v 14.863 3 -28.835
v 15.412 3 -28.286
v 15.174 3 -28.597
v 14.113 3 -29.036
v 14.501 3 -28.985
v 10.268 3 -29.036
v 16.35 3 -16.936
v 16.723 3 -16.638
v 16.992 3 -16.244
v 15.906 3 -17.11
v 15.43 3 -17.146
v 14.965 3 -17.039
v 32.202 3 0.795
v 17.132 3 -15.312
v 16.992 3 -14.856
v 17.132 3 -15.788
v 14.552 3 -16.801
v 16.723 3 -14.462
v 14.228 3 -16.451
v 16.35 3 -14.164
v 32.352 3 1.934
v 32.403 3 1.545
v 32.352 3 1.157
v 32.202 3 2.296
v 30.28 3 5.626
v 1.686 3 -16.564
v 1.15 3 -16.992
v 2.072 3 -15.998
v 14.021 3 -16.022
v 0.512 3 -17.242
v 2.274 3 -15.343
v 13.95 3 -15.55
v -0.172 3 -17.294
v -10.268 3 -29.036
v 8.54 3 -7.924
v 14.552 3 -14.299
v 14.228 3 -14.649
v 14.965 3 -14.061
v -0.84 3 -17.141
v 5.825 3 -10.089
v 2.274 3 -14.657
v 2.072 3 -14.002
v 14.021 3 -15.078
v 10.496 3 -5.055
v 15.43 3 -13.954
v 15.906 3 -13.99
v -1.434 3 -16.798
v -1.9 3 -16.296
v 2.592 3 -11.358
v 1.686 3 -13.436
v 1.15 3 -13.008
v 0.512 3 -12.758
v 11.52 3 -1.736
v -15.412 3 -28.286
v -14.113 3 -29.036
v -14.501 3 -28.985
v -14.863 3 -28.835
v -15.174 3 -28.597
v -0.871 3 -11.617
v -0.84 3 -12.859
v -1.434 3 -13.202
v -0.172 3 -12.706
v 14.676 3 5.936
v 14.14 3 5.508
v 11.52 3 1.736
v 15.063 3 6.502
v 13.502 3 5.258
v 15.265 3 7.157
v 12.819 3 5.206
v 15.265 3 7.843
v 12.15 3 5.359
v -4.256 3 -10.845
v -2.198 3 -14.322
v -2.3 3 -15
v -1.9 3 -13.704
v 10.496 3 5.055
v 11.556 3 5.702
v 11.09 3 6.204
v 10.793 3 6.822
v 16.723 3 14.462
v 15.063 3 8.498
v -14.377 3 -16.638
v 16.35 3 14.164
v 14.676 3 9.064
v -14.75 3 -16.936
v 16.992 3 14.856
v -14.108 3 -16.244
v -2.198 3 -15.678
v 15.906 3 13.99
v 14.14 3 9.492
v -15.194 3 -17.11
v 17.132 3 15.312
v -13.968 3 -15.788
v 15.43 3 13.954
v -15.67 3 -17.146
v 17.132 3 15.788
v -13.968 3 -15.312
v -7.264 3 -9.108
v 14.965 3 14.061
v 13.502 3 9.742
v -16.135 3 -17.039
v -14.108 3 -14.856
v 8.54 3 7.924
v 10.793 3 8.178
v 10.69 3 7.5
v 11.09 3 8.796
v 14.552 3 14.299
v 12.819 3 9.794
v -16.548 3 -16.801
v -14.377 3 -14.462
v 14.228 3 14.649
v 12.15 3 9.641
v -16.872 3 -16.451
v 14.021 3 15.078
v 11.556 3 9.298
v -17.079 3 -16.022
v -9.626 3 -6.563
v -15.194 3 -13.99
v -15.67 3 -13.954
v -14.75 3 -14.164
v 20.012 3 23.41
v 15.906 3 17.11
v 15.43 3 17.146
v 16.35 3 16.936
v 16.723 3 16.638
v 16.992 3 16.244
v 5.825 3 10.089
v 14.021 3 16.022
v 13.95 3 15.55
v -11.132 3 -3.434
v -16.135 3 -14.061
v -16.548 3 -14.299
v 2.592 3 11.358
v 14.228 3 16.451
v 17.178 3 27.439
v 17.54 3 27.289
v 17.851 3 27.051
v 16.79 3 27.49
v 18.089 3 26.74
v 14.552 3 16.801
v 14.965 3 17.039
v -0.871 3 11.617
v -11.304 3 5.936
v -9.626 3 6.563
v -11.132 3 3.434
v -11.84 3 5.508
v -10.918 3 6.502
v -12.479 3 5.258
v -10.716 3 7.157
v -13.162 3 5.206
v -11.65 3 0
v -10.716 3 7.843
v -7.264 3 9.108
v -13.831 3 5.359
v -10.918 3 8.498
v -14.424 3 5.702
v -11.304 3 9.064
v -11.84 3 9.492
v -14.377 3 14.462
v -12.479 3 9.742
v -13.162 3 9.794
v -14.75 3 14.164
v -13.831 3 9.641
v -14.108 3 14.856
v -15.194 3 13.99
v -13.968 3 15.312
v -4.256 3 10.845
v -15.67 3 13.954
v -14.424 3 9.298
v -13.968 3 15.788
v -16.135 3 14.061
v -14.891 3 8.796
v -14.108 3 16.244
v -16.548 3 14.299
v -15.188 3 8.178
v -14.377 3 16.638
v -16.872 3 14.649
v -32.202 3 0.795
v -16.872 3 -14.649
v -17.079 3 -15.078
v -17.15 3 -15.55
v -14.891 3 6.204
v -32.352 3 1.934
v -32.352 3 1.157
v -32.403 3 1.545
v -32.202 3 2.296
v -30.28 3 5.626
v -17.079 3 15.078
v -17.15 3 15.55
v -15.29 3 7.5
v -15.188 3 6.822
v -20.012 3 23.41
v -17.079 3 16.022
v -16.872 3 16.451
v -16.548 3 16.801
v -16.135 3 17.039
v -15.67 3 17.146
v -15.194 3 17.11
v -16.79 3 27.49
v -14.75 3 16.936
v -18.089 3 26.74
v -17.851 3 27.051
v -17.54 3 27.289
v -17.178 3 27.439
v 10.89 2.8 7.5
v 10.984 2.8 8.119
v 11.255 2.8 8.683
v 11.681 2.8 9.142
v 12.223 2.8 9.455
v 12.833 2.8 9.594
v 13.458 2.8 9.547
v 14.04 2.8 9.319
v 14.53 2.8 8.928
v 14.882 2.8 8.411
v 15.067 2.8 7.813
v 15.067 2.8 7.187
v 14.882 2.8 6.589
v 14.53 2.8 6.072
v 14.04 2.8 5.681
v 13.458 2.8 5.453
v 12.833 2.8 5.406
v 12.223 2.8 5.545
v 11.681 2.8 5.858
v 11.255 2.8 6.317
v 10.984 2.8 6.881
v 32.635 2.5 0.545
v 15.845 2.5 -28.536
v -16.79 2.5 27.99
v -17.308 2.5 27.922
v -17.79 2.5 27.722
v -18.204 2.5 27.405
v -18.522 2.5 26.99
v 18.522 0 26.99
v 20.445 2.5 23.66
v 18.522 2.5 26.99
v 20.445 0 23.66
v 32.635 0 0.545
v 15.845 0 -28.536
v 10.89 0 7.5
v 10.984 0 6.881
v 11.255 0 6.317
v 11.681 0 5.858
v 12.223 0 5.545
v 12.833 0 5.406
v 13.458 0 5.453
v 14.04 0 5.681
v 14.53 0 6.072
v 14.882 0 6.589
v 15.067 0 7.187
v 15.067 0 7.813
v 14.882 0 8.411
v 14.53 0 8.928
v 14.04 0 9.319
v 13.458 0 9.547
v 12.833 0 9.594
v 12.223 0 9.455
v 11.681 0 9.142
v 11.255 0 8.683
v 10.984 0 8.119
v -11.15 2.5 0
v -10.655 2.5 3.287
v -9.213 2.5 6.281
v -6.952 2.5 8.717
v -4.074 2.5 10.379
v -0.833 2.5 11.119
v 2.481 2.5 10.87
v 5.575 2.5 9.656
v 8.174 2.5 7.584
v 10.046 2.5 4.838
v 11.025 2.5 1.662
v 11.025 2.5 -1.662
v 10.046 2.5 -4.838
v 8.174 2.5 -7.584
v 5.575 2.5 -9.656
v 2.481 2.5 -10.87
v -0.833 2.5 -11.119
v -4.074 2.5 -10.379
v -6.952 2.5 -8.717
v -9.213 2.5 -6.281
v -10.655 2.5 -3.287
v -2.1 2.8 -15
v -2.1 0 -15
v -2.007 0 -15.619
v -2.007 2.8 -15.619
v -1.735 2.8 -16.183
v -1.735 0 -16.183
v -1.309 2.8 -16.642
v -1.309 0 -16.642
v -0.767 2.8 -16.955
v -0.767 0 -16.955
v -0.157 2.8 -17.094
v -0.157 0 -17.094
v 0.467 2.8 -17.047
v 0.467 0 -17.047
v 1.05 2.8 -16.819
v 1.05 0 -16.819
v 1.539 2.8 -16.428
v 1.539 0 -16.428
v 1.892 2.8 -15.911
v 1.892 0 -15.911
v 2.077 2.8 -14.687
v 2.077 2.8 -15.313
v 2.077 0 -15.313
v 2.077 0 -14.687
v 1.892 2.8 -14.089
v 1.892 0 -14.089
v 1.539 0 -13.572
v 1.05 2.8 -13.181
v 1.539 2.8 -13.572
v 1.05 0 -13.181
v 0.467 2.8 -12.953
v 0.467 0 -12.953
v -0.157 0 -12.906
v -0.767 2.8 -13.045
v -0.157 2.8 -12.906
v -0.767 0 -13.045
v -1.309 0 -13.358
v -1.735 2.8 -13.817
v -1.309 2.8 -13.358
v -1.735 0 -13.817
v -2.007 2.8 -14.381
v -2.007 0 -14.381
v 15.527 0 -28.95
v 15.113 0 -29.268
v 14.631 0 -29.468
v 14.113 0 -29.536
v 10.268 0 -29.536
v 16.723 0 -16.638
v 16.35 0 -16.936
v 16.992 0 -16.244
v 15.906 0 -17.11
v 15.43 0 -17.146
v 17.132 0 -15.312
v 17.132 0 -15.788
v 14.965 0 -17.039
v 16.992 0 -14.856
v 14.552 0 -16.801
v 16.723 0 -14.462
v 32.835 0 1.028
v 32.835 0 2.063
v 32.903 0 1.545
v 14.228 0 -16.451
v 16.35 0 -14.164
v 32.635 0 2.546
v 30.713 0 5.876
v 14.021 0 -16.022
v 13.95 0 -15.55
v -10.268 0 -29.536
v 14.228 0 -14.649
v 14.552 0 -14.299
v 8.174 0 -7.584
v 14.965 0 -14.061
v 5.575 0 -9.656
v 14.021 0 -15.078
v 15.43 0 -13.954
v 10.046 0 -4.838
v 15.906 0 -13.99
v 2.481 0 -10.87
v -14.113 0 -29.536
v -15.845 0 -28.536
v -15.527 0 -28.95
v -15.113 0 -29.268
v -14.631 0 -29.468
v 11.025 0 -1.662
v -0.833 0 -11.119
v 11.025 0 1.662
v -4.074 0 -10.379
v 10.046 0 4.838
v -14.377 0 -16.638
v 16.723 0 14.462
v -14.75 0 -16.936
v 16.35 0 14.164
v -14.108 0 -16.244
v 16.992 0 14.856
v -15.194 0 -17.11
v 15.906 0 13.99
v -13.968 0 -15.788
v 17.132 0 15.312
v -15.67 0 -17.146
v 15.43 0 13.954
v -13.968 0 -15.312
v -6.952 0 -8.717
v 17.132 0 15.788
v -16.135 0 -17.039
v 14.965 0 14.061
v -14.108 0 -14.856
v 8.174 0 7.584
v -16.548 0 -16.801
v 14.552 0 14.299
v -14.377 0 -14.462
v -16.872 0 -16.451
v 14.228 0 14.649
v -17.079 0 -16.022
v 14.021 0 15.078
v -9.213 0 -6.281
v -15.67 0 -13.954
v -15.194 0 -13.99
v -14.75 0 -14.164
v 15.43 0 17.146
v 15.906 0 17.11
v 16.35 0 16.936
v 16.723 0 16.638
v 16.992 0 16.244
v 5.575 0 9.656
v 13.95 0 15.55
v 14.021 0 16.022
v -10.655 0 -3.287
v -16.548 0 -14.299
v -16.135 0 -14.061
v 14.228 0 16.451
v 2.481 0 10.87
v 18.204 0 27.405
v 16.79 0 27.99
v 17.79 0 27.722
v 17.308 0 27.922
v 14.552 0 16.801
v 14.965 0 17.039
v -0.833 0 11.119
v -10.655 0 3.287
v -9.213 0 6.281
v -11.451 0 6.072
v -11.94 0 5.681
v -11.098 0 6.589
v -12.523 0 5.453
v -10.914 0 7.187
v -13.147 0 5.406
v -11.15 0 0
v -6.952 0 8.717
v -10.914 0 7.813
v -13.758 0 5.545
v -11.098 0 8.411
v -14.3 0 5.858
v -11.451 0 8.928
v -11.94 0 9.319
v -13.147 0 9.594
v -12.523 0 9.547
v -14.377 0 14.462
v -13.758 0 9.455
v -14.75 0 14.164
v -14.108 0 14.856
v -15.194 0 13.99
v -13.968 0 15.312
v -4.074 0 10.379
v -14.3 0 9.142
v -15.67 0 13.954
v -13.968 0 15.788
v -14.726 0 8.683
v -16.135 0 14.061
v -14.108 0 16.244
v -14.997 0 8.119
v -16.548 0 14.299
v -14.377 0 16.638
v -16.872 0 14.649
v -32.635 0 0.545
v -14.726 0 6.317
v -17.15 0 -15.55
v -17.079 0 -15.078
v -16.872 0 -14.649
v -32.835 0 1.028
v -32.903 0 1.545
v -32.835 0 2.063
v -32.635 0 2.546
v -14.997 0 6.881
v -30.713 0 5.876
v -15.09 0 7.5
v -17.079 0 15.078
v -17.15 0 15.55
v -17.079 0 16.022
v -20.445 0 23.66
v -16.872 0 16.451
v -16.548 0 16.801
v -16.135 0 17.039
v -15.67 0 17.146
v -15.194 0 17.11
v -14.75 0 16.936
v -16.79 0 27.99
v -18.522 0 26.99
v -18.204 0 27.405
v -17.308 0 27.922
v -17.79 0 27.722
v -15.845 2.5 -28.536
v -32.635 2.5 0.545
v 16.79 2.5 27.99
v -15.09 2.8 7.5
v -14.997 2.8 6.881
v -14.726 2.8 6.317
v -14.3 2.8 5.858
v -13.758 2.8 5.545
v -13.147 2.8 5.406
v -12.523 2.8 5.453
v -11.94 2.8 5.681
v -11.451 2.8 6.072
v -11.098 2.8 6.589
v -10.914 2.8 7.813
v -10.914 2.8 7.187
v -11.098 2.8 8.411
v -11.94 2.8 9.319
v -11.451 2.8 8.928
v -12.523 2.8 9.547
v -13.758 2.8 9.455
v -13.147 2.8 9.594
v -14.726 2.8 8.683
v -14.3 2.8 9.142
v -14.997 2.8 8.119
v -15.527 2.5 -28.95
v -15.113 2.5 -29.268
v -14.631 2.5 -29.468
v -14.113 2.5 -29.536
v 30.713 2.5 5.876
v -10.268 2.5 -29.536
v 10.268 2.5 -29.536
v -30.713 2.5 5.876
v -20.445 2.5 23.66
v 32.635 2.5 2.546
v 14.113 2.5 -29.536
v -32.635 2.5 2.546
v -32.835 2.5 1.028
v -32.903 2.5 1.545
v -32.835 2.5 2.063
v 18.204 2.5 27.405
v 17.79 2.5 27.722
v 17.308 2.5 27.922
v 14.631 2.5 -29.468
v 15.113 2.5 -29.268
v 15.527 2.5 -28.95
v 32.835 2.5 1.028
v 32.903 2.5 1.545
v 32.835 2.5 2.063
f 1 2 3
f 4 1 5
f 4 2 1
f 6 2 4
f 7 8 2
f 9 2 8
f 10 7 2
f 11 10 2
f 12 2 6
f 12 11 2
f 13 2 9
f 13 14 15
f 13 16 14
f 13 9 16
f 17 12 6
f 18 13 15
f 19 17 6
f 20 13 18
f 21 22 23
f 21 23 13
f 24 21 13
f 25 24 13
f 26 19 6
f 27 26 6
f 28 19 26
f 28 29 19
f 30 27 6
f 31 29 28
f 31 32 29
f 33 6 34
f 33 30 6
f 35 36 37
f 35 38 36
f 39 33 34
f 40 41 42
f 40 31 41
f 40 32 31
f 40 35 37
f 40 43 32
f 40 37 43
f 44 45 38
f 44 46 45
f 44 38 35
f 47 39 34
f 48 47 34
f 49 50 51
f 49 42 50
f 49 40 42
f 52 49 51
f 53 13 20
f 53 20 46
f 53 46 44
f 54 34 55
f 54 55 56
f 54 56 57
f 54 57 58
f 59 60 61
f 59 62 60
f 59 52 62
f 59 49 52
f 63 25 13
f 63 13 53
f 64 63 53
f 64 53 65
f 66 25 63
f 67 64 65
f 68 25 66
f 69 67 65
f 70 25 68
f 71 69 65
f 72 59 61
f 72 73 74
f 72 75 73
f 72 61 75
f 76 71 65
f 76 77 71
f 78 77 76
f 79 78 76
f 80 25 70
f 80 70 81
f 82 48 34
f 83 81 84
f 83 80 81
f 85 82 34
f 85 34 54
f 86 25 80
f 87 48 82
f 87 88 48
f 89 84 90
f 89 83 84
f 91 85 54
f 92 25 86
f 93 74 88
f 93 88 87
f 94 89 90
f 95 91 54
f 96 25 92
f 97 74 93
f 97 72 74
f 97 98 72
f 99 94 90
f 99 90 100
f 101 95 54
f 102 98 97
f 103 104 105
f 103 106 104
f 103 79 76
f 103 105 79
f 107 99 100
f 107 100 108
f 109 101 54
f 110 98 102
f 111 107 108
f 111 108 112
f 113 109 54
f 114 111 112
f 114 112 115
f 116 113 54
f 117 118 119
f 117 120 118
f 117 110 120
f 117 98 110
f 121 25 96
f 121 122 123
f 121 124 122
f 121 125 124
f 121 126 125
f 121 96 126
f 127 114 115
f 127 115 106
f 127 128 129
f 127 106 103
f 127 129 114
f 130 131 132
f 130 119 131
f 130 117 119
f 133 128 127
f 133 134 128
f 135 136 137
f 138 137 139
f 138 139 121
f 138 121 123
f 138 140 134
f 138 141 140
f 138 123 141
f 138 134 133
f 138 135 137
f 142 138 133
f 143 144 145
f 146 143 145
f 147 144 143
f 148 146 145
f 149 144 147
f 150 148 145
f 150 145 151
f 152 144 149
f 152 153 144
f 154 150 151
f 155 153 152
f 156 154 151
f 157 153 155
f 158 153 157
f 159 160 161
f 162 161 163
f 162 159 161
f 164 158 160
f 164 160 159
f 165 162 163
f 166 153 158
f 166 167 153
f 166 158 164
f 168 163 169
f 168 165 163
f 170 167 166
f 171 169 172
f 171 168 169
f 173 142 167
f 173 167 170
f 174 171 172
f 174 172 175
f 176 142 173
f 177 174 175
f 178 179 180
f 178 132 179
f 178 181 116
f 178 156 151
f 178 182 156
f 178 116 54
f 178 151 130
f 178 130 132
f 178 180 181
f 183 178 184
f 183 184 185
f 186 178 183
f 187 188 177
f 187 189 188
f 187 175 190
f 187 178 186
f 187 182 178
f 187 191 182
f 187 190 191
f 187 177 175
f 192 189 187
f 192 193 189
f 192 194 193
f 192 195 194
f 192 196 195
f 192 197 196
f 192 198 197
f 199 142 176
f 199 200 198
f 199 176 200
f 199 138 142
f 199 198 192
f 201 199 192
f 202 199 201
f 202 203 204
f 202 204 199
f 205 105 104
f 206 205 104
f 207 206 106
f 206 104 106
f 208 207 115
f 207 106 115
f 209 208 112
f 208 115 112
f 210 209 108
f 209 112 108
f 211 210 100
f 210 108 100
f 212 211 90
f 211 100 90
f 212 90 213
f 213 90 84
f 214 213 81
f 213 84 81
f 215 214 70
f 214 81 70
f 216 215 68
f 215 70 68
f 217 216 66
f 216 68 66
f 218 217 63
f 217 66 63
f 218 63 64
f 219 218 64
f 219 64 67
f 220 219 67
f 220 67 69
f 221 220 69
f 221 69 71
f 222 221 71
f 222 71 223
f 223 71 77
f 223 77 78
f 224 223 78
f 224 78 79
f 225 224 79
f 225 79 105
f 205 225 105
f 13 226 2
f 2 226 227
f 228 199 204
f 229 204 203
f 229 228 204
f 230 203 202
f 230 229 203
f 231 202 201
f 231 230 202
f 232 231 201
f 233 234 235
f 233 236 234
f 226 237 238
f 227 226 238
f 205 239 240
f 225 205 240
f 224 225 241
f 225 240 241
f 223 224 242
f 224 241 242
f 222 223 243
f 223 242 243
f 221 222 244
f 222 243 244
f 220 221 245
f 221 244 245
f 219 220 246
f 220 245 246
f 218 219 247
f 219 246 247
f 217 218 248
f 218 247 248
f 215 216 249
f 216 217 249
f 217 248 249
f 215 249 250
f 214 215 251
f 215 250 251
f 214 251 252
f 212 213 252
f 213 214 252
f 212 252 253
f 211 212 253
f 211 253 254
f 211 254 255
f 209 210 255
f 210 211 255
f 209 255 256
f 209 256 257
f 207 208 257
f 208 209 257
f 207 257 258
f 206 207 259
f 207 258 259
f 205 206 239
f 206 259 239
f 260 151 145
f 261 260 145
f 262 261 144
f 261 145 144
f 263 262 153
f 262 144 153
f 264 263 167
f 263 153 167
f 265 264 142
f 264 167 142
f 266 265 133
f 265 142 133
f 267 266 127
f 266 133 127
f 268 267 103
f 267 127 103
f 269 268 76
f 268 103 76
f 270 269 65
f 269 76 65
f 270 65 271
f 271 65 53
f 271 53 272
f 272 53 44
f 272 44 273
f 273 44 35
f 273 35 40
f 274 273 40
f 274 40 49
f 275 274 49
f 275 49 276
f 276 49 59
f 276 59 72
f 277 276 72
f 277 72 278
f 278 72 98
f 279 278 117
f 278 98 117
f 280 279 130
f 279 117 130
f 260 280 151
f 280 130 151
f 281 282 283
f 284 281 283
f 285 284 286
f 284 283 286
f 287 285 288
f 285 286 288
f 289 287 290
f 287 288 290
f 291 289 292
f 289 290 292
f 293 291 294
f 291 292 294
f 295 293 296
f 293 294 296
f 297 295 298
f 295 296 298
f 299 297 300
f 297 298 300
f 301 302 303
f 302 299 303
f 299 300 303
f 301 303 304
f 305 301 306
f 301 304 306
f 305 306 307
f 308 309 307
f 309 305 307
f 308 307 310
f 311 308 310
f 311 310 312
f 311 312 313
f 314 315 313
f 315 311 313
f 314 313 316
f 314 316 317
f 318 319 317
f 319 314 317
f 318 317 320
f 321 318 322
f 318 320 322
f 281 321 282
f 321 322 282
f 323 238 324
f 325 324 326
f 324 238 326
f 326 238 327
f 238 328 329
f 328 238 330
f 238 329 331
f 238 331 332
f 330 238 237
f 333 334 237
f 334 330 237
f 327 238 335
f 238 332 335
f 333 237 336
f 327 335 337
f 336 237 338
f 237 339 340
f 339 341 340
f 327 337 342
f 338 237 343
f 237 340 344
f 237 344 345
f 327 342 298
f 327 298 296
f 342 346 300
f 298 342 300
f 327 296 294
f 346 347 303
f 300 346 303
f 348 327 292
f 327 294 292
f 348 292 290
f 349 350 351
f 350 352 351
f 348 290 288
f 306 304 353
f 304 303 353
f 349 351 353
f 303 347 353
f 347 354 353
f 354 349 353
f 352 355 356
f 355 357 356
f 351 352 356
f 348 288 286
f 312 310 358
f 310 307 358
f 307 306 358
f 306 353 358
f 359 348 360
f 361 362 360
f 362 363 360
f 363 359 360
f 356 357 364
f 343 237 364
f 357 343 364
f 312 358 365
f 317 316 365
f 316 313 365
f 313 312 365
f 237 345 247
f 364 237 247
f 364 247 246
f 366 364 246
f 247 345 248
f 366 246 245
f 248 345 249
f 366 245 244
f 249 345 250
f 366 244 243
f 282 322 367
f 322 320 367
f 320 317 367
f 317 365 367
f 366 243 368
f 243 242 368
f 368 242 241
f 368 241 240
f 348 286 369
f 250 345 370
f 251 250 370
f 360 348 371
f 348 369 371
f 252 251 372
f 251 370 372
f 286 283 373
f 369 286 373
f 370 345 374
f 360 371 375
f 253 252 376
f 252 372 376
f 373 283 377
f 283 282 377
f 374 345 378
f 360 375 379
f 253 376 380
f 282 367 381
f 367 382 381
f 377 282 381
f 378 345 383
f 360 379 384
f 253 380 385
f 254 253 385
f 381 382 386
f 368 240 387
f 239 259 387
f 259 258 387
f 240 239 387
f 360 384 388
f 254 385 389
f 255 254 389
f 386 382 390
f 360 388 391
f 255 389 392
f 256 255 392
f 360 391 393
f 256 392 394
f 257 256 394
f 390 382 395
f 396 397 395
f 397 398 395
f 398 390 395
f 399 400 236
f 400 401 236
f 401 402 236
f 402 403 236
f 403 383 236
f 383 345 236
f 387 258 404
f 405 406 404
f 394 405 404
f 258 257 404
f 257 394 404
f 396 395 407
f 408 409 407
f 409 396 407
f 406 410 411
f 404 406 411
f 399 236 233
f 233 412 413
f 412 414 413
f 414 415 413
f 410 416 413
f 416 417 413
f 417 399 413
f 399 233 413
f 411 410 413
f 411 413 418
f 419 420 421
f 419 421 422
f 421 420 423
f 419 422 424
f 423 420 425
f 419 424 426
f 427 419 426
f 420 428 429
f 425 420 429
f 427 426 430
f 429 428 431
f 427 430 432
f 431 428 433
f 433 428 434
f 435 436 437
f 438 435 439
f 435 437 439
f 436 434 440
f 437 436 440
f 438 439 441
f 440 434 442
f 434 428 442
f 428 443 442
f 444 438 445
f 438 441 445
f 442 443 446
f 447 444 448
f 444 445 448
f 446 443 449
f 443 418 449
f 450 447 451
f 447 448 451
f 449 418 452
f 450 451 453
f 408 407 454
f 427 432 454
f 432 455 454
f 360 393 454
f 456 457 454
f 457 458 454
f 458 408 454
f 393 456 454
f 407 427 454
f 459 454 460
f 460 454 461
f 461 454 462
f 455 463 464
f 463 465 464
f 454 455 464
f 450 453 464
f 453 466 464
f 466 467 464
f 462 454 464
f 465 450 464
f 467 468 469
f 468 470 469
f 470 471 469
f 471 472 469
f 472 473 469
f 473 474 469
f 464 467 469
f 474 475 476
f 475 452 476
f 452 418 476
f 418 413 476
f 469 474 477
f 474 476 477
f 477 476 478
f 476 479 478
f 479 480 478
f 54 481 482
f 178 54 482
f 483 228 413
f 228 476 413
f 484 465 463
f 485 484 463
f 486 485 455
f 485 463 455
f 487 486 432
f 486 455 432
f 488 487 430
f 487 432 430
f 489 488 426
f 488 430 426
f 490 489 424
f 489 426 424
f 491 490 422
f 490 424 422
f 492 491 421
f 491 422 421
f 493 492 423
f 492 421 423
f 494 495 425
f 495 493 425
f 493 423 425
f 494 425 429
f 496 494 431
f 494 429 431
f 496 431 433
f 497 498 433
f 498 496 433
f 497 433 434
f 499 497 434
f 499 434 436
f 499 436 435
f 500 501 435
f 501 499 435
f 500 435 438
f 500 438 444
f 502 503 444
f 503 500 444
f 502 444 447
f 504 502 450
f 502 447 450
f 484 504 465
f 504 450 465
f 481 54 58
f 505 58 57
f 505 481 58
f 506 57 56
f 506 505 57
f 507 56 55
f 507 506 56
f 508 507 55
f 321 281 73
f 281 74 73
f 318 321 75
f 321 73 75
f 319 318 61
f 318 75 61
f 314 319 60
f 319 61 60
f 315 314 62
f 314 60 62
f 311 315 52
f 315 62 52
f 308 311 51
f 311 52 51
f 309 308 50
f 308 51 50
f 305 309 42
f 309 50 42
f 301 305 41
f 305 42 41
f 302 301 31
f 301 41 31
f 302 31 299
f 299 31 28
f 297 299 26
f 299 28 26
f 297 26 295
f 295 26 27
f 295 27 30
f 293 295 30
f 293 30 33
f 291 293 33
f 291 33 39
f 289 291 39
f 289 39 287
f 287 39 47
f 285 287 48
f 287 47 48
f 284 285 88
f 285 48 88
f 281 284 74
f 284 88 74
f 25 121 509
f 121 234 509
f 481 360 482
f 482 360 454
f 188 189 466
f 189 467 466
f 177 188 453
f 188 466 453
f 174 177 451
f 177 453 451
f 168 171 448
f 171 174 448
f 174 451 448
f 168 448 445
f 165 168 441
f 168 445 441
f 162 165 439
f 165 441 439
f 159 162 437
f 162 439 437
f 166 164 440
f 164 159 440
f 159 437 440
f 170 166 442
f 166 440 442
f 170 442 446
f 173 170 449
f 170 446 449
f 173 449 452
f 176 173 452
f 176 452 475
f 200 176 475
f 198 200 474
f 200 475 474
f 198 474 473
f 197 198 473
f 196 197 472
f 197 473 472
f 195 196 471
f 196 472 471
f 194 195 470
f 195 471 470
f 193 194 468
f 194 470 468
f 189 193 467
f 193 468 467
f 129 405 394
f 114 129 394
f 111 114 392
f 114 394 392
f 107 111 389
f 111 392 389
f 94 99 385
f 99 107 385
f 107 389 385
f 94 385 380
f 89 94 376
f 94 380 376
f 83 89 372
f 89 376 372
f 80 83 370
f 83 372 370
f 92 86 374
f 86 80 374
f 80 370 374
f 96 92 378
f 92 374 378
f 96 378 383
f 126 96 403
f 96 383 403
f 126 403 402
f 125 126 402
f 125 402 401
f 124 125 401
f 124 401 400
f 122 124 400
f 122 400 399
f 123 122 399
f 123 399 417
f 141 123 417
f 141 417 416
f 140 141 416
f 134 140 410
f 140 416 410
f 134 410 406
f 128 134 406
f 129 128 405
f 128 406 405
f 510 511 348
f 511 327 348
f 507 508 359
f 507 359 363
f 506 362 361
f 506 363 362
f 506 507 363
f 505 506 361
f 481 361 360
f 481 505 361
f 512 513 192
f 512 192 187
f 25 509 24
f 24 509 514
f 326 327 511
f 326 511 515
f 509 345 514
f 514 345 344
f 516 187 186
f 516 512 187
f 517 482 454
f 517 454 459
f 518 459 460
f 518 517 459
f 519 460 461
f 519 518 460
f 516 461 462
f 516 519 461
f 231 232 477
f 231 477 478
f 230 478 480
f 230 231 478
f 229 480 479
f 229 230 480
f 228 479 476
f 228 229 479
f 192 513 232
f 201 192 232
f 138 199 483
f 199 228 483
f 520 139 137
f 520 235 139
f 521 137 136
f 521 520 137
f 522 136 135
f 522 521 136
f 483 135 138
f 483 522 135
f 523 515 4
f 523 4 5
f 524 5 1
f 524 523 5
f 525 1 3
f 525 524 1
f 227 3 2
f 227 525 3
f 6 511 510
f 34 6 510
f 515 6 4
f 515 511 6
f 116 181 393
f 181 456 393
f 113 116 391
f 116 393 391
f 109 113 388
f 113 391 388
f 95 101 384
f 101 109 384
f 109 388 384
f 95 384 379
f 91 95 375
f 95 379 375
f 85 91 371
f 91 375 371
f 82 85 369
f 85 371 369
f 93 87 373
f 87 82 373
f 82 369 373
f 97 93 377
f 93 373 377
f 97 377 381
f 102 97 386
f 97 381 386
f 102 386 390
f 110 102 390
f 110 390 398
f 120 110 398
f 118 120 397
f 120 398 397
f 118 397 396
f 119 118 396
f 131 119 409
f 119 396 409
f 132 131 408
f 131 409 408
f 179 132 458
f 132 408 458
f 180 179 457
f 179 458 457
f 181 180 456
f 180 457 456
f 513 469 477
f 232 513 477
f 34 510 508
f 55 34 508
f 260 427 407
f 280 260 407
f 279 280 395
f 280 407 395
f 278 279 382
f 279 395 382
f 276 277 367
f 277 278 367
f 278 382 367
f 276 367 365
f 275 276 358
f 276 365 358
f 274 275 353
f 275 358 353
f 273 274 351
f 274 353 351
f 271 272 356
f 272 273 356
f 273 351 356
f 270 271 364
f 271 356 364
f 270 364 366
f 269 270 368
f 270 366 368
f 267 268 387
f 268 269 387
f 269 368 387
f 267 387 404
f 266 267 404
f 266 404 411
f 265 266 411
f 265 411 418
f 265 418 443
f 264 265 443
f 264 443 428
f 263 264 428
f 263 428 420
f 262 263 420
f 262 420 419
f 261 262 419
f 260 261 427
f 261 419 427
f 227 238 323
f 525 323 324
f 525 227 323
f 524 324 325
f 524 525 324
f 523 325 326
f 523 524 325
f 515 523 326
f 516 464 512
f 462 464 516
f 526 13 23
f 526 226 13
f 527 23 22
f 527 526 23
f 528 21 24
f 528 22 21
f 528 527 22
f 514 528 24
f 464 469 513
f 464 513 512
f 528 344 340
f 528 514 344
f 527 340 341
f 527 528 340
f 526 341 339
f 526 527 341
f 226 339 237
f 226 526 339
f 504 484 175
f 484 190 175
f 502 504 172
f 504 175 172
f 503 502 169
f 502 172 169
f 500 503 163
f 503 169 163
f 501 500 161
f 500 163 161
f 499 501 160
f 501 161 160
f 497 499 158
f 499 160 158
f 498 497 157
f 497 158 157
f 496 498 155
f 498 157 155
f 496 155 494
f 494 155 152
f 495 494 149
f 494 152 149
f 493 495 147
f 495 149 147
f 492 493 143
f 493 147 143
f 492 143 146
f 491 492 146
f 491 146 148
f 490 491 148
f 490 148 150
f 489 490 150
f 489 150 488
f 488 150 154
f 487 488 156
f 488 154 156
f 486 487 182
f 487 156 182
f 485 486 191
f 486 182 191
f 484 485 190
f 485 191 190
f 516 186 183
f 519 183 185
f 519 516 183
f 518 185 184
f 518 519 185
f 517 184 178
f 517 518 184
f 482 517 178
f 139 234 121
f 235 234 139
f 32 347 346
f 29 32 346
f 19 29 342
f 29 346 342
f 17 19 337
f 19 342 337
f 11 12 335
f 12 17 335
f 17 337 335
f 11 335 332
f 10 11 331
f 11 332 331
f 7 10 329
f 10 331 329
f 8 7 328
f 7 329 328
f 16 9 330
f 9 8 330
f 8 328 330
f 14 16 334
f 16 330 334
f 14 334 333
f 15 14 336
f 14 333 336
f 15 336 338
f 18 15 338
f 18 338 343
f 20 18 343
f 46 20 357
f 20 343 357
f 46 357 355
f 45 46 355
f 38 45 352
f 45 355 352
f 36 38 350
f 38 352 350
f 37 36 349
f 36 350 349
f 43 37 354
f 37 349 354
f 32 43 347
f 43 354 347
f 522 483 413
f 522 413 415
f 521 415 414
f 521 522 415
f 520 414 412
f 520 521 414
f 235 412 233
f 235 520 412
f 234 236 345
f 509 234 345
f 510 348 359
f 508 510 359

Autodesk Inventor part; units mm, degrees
ref_plane "YZ Plane" through (0, 0, 0) normal (1, 0, 0) x (0, 1, 0)
ref_plane "XZ Plane" through (0, 0, 0) normal (0, 1, 0) x (-1, 0, 0)
ref_plane "XY Plane" through (0, 0, 0) normal (0, 0, 1) x (1, 0, 0)
sketch "Sketch1" plane through (0, 0, 0) normal (0, 1, 0) x (-1, 0, 0)
  circle A0 centre (0, -15) radius 2.1
  circle A1 centre (12.9904, 7.5) radius 2.1
  circle A2 centre (-12.9904, 7.5) radius 2.1
  line L0 (20.4449, 23.6603) -> (30.7128, 5.8756)
  line L1 (-20.4449, 23.6603) -> (-30.7128, 5.8756)
  line L2 (-10.2679, -29.5359) -> (10.2679, -29.5359)
  circle A3 centre (15.55, -15.55) radius 1.6
  circle A4 centre (15.55, 15.55) radius 1.6
  circle A5 centre (-15.55, 15.55) radius 1.6
  circle A6 centre (-15.55, -15.55) radius 1.6
  line L3 (30.7128, 5.8756) -> (33.2128, 1.5455)
  line L4 (-20.4449, 23.6603) -> (-17.9449, 27.9904)
  line L5 (-10.2679, -29.5359) -> (-15.2679, -29.5359)
  line L6 (10.2679, -29.5359) -> (15.2679, -29.5359)
  line L7 (20.4449, 23.6603) -> (17.9449, 27.9904)
  line L8 (-30.7128, 5.8756) -> (-33.2128, 1.5455)
  line L9 (17.9449, 27.9904) -> (-17.9449, 27.9904)
  line L10 (15.2679, -29.5359) -> (33.2128, 1.5455)
  line L11 (17.9449, 27.9904) -> (-17.9449, 27.9904)
  line L12 (-33.2128, 1.5455) -> (-15.2679, -29.5359)
  circle A7 centre (0, 0) radius 11.15
  dimension "d29" = 360
  dimension "d77" = 360
  dimension "d82" = 360
  dimension "d86" = 360
  dimension "d90" = 360
sketch "Sketch4" plane through (0, 0, 0) normal (0, 1, 0) x (-1, 0, 0)
  point P0 (0, 0)
extrude "Extrusion5" add sketch "Sketch1" along normal blind 3
chamfer "Chamfer6" distance 0.5 angle 45 1 edges at (11.15, 3, 0)
chamfer "Chamfer7" distance 0.2 angle 45 3 edges at (-10.8904, 3, 7.5) (2.1, 3, -15) (15.0904, 3, 7.5)
fillet "Fillet1" radius 2 6 edges at (17.9449, 1.5, 27.9904) (33.2128, 1.5, 1.5455) (15.2679, 1.5, -29.5359) (-15.2679, 1.5, -29.5359) (-33.2128, 1.5, 1.5455) (-17.9449, 1.5, 27.9904)
chamfer "Chamfer8" distance 0.5 angle 45 12 edges at (-24.2404, 3, -13.9952) (-32.9034, 3, 1.5455) (-25.5788, 3, 14.7679) (-17.7902, 3, 27.7224) (0, 3, 27.9904) (17.7902, 3, 27.7224) (25.5788, 3, 14.7679) (32.9034, 3, 1.5455) (24.2404, 3, -13.9952) (15.1132, 3, -29.2679) (0, 3, -29.5359) (-15.1132, 3, -29.2679)
properties part number "4_DOF"
